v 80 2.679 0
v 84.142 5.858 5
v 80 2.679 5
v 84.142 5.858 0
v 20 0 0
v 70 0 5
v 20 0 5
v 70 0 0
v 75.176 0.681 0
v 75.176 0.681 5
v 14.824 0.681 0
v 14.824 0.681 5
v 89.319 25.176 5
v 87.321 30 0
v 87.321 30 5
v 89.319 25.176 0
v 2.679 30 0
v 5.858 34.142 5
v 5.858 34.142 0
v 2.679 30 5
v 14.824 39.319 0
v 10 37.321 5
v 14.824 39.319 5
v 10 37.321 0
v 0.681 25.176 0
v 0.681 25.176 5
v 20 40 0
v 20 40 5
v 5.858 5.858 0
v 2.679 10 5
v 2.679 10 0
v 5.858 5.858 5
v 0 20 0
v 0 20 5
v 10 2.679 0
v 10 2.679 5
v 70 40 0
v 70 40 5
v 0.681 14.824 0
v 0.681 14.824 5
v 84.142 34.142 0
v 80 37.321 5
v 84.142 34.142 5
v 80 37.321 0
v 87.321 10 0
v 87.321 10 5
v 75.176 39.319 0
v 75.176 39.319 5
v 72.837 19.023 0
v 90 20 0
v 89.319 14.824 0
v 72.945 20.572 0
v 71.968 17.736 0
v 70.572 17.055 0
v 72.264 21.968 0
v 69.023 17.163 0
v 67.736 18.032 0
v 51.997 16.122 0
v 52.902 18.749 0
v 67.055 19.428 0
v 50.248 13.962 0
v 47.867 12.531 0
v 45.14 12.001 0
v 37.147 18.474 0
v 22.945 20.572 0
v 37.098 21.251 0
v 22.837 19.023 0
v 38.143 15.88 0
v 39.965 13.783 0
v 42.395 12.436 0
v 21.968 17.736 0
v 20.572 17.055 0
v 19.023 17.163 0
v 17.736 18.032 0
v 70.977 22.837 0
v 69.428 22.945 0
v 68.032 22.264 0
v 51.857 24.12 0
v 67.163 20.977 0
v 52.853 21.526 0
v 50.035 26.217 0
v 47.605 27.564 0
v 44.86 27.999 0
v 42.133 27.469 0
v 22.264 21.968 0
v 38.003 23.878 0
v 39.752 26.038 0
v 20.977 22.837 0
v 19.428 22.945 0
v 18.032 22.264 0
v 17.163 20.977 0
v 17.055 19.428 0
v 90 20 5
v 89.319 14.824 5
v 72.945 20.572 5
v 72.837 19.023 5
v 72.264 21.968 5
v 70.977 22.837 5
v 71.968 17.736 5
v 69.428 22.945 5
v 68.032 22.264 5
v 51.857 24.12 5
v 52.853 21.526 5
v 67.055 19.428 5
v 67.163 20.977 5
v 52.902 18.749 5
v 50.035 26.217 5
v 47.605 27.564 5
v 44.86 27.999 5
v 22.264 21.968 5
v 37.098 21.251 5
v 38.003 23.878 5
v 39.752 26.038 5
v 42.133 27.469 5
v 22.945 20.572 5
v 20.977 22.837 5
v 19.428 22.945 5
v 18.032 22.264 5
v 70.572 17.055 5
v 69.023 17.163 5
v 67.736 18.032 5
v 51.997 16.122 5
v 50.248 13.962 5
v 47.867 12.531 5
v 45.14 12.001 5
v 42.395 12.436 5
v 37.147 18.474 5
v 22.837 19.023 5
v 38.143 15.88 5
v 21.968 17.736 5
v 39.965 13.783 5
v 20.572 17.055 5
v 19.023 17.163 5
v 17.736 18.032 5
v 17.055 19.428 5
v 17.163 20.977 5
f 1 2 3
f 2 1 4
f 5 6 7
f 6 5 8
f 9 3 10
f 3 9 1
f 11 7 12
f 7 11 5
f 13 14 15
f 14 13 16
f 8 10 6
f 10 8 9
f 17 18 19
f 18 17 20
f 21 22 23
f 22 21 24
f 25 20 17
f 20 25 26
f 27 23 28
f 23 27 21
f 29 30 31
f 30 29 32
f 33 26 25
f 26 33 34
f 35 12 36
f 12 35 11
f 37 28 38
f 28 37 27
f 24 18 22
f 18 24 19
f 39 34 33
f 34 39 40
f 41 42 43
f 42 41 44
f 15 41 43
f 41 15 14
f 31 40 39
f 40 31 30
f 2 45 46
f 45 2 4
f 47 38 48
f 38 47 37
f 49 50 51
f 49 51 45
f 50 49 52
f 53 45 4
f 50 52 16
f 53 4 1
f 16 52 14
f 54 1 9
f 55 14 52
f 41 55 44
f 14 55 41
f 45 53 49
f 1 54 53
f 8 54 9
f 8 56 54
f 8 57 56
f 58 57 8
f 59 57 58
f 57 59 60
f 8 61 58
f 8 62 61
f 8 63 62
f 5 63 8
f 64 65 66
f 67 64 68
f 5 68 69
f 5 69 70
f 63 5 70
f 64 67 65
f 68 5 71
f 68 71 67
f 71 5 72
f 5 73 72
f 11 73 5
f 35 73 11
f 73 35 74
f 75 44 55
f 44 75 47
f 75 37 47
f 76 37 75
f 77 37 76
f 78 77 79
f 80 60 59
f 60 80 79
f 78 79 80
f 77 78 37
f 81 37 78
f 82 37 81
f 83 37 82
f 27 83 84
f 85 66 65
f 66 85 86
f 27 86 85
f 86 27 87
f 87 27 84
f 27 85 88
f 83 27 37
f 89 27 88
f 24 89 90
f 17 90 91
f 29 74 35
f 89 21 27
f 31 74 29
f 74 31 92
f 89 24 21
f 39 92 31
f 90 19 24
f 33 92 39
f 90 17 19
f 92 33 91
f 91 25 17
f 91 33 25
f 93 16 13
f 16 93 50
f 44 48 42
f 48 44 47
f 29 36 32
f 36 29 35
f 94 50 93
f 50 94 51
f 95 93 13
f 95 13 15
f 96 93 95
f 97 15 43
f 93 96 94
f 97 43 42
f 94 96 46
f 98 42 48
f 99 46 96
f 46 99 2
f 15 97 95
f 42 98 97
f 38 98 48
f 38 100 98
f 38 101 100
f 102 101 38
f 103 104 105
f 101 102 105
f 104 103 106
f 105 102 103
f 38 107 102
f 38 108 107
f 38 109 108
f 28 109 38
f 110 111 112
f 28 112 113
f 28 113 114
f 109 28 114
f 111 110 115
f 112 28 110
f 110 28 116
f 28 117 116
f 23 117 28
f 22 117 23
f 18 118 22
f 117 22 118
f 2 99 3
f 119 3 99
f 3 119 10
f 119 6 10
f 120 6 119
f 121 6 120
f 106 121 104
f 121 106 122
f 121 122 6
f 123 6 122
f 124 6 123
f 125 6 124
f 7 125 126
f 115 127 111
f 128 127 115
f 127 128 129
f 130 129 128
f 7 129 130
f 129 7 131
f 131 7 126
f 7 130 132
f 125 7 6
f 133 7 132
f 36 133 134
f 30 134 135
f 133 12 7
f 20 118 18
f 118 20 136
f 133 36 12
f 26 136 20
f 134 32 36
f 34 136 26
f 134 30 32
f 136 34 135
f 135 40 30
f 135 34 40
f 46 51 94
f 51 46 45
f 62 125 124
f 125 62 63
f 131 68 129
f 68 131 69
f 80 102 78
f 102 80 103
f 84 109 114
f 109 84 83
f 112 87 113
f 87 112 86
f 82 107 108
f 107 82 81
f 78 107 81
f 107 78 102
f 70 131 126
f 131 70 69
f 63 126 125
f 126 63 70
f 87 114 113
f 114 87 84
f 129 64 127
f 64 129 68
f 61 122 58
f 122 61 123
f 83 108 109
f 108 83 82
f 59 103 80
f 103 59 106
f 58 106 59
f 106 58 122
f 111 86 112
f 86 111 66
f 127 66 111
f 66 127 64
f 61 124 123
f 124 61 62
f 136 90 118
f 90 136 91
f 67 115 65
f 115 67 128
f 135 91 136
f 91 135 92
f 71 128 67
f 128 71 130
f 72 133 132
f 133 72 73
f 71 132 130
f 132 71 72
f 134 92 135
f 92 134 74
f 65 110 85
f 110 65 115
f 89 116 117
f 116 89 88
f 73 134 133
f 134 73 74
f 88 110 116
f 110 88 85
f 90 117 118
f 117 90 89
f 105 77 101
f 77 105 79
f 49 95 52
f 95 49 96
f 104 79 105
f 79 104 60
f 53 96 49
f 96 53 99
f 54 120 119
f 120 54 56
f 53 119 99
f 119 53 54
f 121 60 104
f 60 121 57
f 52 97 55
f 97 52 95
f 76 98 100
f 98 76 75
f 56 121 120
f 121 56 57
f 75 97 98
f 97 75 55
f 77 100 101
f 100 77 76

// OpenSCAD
$fn = 32;

// ----------------------------------------------------------------------
// Spacer plate: obround span 50, caps R20
// ----------------------------------------------------------------------

// --- parameters (mm) ---
bore_r = 8;               // centre bore radius
bolt_r = 3;               // bolt hole radius
plate_t = 5;              // plate thickness, Z (extrusion height)
span = 50;                // obround span
cap_r = 20;               // cap radius
fit_tol = 0.1;            // declared fit tolerance (prompt contract)
free_tol = 0.5;           // declared free tolerance (prompt contract)

profile = [[20, 40], [14.824, 39.319], [10, 37.321], [5.858, 34.142], [2.679, 30], [0.681, 25.176], [0, 20], [0.681, 14.824], [2.679, 10], [5.858, 5.858], [10, 2.679], [14.824, 0.681], [20, 0], [70, 0], [75.176, 0.681], [80, 2.679], [84.142, 5.858], [87.321, 10], [89.319, 14.824], [90, 20], [89.319, 25.176], [87.321, 30], [84.142, 34.142], [80, 37.321], [75.176, 39.319], [70, 40]];  // primary outline, 26 points, counter clockwise
void_1 = [[52.853, 21.526], [51.857, 24.12], [50.035, 26.217], [47.605, 27.564], [44.86, 27.999], [42.133, 27.469], [39.752, 26.038], [38.003, 23.878], [37.098, 21.251], [37.147, 18.474], [38.143, 15.88], [39.965, 13.783], [42.395, 12.436], [45.14, 12.001], [47.867, 12.531], [50.248, 13.962], [51.997, 16.122], [52.902, 18.749]];  // centre bore, 18 points
void_2 = [[22.945, 20.572], [22.264, 21.968], [20.977, 22.837], [19.428, 22.945], [18.032, 22.264], [17.163, 20.977], [17.055, 19.428], [17.736, 18.032], [19.023, 17.163], [20.572, 17.055], [21.968, 17.736], [22.837, 19.023]];  // end hole, 12 points
void_3 = [[72.945, 20.572], [72.264, 21.968], [70.977, 22.837], [69.428, 22.945], [68.032, 22.264], [67.163, 20.977], [67.055, 19.428], [67.736, 18.032], [69.023, 17.163], [70.572, 17.055], [71.968, 17.736], [72.837, 19.023]];  // end hole, 12 points

// --- the one profile operation ---
difference() {
  linear_extrude(height = plate_t) polygon(points = profile);
  translate([0, 0, -1])
    linear_extrude(height = plate_t + 2) polygon(points = void_1);
  translate([0, 0, -1])
    linear_extrude(height = plate_t + 2) polygon(points = void_2);
  translate([0, 0, -1])
    linear_extrude(height = plate_t + 2) polygon(points = void_3);
}
